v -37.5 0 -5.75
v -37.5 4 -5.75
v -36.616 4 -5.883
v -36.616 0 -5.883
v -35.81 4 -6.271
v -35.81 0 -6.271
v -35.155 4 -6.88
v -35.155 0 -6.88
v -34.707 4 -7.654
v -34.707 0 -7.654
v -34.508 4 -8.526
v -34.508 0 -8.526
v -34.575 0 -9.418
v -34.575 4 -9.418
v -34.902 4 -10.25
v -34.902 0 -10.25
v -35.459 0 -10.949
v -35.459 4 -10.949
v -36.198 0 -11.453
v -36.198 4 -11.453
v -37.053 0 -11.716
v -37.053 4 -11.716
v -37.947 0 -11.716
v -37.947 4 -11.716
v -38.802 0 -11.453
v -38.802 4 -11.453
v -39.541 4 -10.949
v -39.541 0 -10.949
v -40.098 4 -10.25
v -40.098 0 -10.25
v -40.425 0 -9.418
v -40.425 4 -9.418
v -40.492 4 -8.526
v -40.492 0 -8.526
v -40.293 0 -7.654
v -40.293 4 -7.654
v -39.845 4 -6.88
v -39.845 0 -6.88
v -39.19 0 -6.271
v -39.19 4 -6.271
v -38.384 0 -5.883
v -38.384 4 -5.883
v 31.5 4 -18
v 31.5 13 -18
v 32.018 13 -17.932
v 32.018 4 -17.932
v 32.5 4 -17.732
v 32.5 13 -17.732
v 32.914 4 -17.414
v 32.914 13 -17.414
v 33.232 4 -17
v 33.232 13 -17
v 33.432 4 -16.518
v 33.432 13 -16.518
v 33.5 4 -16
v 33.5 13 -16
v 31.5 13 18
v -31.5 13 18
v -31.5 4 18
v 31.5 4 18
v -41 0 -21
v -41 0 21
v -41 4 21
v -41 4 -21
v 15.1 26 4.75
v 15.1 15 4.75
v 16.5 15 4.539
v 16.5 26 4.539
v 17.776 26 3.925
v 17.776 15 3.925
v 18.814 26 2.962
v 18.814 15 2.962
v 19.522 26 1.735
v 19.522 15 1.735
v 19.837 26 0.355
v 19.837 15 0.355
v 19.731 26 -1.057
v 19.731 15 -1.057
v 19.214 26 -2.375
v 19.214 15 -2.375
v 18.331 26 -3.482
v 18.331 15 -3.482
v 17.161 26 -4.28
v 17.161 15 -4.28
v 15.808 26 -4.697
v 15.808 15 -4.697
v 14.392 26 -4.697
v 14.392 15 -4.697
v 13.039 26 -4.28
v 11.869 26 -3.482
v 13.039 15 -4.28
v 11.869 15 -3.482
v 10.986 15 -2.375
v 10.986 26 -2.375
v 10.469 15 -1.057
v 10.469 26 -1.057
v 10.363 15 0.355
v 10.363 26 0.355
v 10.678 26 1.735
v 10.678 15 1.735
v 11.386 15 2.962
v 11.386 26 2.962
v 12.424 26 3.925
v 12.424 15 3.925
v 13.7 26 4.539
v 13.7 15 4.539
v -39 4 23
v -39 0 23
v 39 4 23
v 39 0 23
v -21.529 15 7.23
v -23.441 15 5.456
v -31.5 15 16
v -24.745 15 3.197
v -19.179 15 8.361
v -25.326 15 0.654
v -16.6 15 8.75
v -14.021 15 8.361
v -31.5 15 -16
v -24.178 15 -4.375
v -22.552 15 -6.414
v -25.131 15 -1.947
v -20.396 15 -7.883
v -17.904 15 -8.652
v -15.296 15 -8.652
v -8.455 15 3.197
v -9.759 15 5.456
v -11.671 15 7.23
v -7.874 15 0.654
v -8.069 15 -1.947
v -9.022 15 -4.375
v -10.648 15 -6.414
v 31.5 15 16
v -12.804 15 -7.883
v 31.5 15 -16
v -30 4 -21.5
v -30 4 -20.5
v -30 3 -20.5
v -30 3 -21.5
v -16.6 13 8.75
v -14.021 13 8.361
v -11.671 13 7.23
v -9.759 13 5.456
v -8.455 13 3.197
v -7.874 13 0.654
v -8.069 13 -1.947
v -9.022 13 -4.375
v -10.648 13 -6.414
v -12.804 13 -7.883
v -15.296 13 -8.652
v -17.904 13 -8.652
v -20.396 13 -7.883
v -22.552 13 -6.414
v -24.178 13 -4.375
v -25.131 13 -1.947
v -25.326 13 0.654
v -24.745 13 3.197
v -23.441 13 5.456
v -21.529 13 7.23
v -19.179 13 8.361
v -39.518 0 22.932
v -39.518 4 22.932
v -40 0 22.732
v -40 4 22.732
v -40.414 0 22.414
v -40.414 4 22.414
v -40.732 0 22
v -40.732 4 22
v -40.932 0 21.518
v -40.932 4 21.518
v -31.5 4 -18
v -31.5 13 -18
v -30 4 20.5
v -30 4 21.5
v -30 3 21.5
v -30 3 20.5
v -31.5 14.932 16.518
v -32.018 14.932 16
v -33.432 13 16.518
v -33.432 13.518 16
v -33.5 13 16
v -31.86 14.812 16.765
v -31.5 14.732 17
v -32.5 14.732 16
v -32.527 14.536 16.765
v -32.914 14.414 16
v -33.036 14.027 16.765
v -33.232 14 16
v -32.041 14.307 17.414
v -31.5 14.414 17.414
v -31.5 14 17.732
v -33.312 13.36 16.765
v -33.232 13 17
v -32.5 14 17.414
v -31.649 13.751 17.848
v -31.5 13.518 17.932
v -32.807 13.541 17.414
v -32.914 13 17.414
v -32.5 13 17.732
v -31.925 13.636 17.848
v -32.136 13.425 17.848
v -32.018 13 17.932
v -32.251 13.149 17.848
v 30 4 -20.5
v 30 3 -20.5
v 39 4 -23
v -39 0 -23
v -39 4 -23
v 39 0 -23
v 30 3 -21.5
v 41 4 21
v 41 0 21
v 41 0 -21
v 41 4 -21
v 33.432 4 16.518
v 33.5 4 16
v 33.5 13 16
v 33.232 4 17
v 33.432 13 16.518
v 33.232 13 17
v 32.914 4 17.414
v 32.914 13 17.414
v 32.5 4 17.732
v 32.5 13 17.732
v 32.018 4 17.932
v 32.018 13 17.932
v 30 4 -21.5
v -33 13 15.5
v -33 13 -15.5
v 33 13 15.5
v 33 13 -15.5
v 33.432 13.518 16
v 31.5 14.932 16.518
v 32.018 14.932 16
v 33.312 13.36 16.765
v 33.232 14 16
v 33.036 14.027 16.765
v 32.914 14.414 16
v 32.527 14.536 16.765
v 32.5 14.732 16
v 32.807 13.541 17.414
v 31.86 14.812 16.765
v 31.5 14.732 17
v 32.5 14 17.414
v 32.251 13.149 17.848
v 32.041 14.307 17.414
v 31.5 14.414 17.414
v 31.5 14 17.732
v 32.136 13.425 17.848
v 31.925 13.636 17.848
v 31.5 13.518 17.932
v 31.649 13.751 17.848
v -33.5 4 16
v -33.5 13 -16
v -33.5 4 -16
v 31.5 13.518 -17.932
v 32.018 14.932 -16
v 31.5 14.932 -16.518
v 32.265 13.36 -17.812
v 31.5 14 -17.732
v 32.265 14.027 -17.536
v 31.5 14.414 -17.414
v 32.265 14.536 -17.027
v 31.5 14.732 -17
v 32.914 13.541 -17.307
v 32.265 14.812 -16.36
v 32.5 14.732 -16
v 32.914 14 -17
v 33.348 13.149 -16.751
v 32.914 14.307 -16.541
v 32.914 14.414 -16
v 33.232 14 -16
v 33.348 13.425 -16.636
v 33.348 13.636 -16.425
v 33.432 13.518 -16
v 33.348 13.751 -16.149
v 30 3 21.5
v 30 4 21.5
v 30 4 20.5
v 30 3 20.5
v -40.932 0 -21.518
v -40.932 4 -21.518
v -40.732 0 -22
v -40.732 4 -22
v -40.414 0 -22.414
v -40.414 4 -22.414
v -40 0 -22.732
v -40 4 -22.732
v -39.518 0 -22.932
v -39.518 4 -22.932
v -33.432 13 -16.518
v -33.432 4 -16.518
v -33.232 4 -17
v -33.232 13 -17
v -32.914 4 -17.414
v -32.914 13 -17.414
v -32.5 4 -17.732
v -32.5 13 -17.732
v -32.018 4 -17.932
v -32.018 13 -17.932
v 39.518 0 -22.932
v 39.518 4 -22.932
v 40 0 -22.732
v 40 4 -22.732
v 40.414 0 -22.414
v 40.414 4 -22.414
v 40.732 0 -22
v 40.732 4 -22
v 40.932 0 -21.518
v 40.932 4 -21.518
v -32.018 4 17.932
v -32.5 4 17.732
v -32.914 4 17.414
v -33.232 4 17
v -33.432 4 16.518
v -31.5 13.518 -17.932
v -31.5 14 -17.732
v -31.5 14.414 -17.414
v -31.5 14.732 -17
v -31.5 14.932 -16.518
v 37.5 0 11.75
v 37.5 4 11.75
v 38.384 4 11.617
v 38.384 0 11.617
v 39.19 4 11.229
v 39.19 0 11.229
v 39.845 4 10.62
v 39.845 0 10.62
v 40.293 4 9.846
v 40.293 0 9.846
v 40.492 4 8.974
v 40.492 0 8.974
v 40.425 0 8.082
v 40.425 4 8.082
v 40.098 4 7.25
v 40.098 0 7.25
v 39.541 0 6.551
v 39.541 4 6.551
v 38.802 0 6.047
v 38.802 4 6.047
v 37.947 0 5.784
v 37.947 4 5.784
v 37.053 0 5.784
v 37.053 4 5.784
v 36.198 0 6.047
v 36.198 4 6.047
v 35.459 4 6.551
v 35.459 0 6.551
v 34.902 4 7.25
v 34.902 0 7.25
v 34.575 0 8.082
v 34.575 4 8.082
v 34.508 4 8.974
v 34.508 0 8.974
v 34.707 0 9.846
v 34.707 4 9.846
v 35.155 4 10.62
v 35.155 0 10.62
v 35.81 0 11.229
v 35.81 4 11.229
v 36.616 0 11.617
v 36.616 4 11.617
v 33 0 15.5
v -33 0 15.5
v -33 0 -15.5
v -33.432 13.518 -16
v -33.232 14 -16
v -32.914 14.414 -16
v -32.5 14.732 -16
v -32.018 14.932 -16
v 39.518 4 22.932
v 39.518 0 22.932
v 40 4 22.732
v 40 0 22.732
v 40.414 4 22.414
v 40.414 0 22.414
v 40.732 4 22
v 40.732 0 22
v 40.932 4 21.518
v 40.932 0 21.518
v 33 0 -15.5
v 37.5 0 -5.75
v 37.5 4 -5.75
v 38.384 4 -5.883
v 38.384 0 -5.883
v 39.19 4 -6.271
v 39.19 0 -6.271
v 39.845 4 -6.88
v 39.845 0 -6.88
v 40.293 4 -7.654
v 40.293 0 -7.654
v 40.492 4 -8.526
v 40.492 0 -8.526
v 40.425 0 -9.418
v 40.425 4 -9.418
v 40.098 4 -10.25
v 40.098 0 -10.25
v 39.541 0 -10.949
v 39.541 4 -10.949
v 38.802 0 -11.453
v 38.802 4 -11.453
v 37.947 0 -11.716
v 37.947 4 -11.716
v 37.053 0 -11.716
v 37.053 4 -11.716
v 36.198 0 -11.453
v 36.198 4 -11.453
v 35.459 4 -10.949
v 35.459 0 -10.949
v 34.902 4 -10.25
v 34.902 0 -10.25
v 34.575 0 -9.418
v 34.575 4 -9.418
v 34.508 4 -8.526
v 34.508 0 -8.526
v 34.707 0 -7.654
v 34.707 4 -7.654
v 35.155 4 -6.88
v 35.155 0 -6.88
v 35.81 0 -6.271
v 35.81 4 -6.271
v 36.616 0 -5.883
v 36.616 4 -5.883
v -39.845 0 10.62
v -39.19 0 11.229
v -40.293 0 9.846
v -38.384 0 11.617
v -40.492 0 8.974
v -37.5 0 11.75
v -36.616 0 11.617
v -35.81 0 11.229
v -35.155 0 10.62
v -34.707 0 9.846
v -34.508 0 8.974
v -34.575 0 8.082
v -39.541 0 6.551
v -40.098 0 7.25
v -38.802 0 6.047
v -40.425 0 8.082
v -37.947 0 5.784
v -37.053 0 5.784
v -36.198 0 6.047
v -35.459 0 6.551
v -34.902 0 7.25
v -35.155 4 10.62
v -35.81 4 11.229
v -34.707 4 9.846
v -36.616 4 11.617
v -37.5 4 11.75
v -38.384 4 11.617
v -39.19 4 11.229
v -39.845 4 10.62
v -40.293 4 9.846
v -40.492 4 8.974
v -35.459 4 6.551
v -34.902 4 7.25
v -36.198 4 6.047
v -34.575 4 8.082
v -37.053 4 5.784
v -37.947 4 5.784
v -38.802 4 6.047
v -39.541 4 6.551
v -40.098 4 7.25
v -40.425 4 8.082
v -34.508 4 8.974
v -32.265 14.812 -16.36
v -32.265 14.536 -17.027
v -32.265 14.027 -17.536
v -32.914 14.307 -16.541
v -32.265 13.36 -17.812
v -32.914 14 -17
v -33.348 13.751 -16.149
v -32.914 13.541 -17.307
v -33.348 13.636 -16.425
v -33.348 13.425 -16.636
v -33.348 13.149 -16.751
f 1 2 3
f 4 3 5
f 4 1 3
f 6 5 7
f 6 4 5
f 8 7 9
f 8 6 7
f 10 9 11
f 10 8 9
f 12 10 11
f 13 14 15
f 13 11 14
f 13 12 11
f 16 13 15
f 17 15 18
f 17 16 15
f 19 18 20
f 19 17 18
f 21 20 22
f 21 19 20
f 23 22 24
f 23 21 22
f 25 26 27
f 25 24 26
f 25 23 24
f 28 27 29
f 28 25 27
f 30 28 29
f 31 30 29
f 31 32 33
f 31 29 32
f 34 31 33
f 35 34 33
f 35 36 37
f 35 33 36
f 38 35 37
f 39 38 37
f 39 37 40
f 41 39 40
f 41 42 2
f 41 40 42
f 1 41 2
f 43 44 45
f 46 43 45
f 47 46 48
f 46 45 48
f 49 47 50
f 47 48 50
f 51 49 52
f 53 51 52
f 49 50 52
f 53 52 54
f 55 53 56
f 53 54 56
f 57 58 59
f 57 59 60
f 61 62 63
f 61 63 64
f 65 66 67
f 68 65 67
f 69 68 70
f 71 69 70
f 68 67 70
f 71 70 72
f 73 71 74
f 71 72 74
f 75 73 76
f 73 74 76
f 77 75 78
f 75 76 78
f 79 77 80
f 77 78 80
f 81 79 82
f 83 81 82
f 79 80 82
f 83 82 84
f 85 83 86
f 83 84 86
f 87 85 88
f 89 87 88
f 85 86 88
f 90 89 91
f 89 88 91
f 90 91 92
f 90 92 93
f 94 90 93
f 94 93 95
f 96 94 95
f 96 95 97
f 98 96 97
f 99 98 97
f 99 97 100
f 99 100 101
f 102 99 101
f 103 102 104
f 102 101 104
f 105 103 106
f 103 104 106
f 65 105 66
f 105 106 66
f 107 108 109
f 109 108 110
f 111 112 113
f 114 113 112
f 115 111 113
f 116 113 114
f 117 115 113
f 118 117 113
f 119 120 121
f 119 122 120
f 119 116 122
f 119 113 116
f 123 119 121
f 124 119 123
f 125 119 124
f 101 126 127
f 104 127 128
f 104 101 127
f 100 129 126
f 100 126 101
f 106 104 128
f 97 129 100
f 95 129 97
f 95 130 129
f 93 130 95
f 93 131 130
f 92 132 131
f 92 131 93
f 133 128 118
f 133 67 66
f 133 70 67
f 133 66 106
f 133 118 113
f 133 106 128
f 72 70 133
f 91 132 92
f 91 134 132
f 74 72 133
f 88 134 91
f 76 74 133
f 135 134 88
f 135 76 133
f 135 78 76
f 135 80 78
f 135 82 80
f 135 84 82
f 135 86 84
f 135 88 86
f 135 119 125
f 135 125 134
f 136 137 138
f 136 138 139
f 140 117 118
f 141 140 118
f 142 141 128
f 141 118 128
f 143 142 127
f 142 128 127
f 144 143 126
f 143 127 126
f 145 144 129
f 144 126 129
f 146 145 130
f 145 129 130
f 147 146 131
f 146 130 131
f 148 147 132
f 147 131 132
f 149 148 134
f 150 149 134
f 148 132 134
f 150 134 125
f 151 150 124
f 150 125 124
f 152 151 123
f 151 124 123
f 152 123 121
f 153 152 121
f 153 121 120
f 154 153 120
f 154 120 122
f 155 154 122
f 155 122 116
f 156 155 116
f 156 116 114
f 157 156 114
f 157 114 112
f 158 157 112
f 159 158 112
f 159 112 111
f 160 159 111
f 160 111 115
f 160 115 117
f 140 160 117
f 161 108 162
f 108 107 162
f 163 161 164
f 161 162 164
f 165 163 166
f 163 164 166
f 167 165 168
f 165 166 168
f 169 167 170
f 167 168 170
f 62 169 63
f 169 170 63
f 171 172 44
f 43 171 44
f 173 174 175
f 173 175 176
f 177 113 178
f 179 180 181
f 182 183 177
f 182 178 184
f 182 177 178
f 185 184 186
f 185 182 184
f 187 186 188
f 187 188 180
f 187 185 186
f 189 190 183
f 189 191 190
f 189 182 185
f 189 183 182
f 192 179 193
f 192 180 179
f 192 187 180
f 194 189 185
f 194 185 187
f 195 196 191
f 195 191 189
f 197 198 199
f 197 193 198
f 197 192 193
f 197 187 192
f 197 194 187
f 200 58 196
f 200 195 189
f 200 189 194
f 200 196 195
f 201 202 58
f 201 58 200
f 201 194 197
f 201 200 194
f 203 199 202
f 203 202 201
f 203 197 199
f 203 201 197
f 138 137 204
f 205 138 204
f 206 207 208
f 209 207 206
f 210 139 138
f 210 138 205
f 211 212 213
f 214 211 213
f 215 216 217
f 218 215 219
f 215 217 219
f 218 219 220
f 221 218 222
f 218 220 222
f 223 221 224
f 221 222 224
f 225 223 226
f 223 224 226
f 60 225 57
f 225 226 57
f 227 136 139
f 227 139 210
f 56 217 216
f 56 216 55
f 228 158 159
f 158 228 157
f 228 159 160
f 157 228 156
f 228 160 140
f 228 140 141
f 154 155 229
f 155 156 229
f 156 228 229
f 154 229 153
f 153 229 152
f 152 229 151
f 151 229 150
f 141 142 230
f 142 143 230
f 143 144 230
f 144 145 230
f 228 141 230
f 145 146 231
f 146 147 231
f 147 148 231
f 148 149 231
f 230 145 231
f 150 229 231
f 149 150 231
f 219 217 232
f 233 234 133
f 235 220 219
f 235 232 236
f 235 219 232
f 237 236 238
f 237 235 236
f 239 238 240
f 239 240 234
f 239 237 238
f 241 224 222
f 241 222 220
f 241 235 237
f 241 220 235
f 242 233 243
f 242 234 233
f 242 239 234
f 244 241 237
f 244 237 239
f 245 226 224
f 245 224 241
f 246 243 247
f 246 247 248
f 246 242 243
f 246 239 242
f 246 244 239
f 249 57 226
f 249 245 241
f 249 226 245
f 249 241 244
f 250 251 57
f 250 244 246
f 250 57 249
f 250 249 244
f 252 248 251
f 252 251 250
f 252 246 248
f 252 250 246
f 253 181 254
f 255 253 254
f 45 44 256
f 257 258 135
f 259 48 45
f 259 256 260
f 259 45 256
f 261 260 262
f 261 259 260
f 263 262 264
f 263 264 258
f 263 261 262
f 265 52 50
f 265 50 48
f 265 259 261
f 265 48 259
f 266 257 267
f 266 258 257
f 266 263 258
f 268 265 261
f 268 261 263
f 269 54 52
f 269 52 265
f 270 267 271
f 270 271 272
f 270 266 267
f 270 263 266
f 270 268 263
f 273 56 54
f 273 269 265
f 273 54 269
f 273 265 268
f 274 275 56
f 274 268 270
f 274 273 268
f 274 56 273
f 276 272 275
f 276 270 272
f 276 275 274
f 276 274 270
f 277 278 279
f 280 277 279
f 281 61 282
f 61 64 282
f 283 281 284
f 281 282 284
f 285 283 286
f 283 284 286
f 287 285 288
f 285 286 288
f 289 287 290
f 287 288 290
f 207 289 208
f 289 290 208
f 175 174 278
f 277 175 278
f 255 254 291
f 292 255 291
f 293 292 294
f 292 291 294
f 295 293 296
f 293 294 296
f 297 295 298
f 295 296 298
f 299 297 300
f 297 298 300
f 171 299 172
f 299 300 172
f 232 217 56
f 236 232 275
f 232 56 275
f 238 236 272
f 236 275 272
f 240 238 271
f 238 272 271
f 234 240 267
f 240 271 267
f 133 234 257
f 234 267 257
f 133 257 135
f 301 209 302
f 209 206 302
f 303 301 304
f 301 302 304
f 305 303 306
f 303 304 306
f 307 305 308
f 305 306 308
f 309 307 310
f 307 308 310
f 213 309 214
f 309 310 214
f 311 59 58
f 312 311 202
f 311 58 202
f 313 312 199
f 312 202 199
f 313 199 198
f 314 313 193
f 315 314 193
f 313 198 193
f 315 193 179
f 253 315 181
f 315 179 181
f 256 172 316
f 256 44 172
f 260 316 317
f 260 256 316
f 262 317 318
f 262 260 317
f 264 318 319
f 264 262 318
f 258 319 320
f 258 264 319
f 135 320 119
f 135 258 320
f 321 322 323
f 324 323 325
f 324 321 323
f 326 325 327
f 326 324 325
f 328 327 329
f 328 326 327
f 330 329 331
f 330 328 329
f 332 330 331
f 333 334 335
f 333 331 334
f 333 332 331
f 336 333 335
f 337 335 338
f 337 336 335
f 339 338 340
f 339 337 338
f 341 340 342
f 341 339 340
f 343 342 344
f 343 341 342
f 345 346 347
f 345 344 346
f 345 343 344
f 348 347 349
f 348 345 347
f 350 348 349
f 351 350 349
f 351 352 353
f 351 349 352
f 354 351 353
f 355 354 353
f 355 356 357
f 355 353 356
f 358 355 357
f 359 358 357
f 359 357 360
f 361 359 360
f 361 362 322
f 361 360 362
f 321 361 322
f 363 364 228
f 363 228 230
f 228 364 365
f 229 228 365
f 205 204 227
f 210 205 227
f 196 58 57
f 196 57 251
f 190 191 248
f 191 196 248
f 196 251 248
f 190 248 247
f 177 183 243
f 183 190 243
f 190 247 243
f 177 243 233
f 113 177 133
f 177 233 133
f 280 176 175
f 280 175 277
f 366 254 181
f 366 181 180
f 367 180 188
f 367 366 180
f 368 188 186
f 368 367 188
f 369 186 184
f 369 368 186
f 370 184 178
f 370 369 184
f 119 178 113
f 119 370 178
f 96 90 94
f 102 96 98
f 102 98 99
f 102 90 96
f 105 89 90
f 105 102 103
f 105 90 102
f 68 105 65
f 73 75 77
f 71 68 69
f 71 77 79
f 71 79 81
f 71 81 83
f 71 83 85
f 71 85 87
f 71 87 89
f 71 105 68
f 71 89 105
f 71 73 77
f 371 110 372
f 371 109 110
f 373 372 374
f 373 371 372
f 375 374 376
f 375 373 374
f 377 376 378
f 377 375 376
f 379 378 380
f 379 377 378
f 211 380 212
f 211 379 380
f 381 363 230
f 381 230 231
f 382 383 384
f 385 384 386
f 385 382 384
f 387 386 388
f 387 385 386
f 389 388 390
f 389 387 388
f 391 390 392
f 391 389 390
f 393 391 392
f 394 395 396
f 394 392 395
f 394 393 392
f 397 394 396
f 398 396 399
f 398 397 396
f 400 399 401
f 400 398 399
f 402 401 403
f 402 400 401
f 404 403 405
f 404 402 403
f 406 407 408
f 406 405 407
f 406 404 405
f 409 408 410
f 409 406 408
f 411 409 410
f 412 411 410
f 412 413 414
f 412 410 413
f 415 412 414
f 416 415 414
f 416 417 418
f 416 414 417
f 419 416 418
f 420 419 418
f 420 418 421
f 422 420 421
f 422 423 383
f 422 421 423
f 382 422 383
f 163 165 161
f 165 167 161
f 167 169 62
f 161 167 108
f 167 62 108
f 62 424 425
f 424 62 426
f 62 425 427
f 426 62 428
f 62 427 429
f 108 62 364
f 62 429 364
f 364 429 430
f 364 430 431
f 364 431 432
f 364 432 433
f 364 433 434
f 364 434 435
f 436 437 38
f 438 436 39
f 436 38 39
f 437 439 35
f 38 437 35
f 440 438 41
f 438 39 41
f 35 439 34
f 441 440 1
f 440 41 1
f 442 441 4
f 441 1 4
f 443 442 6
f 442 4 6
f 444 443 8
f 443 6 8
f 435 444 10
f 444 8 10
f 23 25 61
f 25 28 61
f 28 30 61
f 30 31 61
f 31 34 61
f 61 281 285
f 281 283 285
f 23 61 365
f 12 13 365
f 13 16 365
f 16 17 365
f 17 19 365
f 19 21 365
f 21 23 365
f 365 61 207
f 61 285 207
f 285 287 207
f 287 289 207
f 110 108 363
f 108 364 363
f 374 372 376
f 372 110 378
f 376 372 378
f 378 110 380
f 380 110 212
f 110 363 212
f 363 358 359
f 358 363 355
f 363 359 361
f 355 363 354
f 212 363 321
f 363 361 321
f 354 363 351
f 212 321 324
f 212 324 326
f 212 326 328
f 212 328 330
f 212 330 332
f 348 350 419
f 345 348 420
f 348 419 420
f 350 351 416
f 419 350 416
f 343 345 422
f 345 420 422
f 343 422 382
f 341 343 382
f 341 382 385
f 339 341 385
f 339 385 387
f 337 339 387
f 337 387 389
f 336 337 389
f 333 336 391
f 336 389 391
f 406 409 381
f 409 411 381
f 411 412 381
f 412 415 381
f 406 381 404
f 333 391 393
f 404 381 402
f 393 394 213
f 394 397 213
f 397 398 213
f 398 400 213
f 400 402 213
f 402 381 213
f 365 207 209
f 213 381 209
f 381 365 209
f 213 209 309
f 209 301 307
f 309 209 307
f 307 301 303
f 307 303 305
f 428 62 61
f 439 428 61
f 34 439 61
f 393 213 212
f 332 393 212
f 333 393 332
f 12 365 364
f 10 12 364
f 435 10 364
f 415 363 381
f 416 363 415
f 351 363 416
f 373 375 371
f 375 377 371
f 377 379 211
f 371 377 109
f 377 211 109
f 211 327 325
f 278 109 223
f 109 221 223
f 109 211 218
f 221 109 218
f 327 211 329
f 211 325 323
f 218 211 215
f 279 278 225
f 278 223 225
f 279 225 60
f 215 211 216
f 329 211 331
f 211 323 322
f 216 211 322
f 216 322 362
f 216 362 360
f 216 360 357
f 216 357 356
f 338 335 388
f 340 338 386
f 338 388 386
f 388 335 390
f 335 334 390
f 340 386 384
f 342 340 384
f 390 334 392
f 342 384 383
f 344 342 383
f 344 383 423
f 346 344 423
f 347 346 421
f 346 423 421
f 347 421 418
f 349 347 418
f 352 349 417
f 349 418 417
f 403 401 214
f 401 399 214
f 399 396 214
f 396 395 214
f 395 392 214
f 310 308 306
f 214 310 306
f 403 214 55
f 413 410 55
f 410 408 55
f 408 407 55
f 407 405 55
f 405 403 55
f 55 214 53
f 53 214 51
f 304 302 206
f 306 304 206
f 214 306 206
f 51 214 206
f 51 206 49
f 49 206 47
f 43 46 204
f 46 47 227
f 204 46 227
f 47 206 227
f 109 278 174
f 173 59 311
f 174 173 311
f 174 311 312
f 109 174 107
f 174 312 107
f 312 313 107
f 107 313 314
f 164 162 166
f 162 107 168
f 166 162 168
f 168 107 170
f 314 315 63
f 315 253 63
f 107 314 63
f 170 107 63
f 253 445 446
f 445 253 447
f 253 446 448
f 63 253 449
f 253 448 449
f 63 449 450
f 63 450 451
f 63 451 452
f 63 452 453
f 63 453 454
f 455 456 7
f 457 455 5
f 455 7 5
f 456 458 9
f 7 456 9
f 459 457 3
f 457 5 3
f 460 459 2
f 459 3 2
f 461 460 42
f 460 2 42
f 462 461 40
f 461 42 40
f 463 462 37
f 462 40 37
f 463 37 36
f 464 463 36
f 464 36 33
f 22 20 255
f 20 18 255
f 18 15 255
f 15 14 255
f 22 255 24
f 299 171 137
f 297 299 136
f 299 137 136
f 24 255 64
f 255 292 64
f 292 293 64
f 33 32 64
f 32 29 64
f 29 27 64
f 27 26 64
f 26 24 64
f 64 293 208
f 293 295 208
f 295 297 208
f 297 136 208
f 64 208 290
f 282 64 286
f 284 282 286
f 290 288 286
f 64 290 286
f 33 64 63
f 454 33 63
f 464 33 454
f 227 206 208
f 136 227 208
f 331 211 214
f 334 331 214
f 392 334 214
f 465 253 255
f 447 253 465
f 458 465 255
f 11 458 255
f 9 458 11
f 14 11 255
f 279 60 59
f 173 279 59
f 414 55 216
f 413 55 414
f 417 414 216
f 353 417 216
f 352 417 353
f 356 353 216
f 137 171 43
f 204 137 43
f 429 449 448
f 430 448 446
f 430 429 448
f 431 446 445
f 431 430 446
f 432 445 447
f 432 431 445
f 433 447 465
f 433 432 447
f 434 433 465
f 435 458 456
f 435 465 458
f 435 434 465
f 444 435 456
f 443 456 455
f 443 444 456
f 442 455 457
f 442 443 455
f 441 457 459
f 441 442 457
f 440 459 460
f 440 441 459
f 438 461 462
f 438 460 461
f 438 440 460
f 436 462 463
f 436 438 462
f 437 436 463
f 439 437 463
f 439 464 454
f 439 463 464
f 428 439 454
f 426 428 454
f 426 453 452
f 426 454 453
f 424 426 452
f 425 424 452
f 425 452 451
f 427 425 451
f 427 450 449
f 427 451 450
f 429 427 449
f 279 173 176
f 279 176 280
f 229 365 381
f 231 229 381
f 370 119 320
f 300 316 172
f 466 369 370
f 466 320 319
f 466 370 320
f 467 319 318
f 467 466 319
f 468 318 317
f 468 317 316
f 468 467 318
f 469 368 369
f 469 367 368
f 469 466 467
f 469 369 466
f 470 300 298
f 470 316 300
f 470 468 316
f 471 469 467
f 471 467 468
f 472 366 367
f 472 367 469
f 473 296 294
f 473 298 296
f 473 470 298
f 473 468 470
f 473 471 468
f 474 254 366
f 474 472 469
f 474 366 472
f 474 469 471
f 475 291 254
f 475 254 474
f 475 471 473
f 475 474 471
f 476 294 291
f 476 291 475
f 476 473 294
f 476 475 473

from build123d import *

# Parameters (mm, degrees)
ESQUISSE1_W             = 82
ESQUISSE1_H             = 46
ESQUISSE1_R             = 3
BOSS_EXTRU_1_DEPTH      = 15
ESQUISSE2_W             = 66
ESQUISSE2_H             = 31
ENL_V_MAT_EXTRU_1_DEPTH = 13
ENL_V_START             = 15
ESQUISSE3_R             = 8.75
ENL_V_MAT_EXTRU_2_DEPTH = 65.345719166
ESQUISSE4_W             = 67
ESQUISSE4_H             = 36
ENL_V_MAT_EXTRU_3_DEPTH = 11
BOSS_EXTRU_3_START      = 15
ESQUISSE5_R             = 4.75
BOSS_EXTRU_3_DEPTH      = 11
ENL_V_START_2           = 4
ESQUISSE1_4_W           = 60
ESQUISSE1_4_H           = 1
ENL_V_MAT_EXTRU_4_DEPTH = 1
CONG_1_R                = 2
CONG_2_R                = 2
CONG_4_R                = 2


with BuildPart() as part:
    # Esquisse1 → Boss.-Extru.1 (new body)
    with BuildSketch(Plane(origin=(0, 0, 0), x_dir=(1, 0, 0), z_dir=(0, 1, 0))):
        Rectangle(ESQUISSE1_W, ESQUISSE1_H)
        with Locations(Location((-37.5, 8.75, 0), (0, 0, 270))):
            Circle(ESQUISSE1_R, mode=Mode.SUBTRACT)
        with Locations(Location((37.5, 8.75, 0), (0, 0, 270))):
            Circle(ESQUISSE1_R, mode=Mode.SUBTRACT)
        with Locations(Location((37.5, -8.75, 0), (0, 0, 270))):
            Circle(ESQUISSE1_R, mode=Mode.SUBTRACT)
        with Locations(Location((-37.5, -8.75, 0), (0, 0, 270))):
            Circle(ESQUISSE1_R, mode=Mode.SUBTRACT)
    extrude(amount=BOSS_EXTRU_1_DEPTH)

    # Esquisse2 → Enlèv. mat.-Extru.1 (cut)
    with BuildSketch(Plane(origin=(0, 0, 0), x_dir=(1, 0, 0), z_dir=(0, 1, 0))):
        Rectangle(ESQUISSE2_W, ESQUISSE2_H)
    extrude(amount=ENL_V_MAT_EXTRU_1_DEPTH, mode=Mode.SUBTRACT)

    # Esquisse3 → Enlèv. mat.-Extru.2 (cut, through all)
    with BuildSketch(Plane(origin=(0, 0, 0), x_dir=(1, 0, 0), z_dir=(0, 1, 0)).offset(ENL_V_START)):
        with Locations(Location((-16.6, 0, 0), (0, 0, 270))):
            Circle(ESQUISSE3_R)
    extrude(amount=-ENL_V_MAT_EXTRU_2_DEPTH, mode=Mode.SUBTRACT)

    # Esquisse4 → Enlèv. mat.-Extru.3 (cut)
    with BuildSketch(Plane(origin=(0, 0, 0), x_dir=(1, 0, 0), z_dir=(0, 1, 0)).offset(ENL_V_START)):
        Polygon((-33.5, -23), (-41, -23), (-41, 23), (-33.5, 23), (33.5, 23), (41, 23), (41, -23), (33.5, -23), align=None)
        Rectangle(ESQUISSE4_W, ESQUISSE4_H, mode=Mode.SUBTRACT)
    extrude(amount=-ENL_V_MAT_EXTRU_3_DEPTH, mode=Mode.SUBTRACT)

    # Esquisse5 → Boss.-Extru.3 (add)
    with BuildSketch(Plane(origin=(0, 0, 0), x_dir=(1, 0, 0), z_dir=(0, 1, 0)).offset(BOSS_EXTRU_3_START)):
        with Locations(Location((15.1, 0, 0), (0, 0, 270))):
            Circle(ESQUISSE5_R)
    extrude(amount=BOSS_EXTRU_3_DEPTH)

    # Esquisse1<4> → Enlèv. mat.-Extru.4 (cut)
    with BuildSketch(Plane(origin=(0, 0, 0), x_dir=(1, 0, 0), z_dir=(0, 1, 0)).offset(ENL_V_START_2)):
        with Locations((0, -21)):
            Rectangle(ESQUISSE1_4_W, ESQUISSE1_4_H)
        with Locations((0, 21)):
            Rectangle(ESQUISSE1_4_W, ESQUISSE1_4_H)
    extrude(amount=-ENL_V_MAT_EXTRU_4_DEPTH, mode=Mode.SUBTRACT)

    # Congé1
    cong_1_edges = [part.edges().sort_by_distance(p)[0] for p in [
        (0, 15, 18),
        (-33.5, 15, 0),
        (0, 15, -18),
        (33.5, 15, 0),
    ]]
    fillet(cong_1_edges, radius=CONG_1_R)

    # Congé2
    # the kernel refuses this fillet: 2 mm, written as the material it takes off along each edge
    with BuildSketch(Plane(origin=(-31.5, 13, -16), x_dir=(0, 0, -1), z_dir=(-1, 0, 0))) as cong_2_piece_1_section:
        Polygon((0, 0), (CONG_2_R, 0), (CONG_2_R, -CONG_2_R), (0, -CONG_2_R), align=None)
    cong_2_piece_1 = extrude(amount=CONG_2_R, mode=Mode.PRIVATE)
    cong_2_piece_1 = cong_2_piece_1 - Plane(origin=(-31.5, 13, -16), x_dir=(0, -0.7071067811865475, 0.7071067811865475), z_dir=(-1, 0, 0)) * Sphere(CONG_2_R, mode=Mode.PRIVATE)
    add(cong_2_piece_1, mode=Mode.SUBTRACT)
    with BuildSketch(Plane(origin=(-31.5, 13, 16), x_dir=(-1, 0, 0), z_dir=(0, 0, 1))) as cong_2_piece_2_section:
        Polygon((0, 0), (CONG_2_R, 0), (CONG_2_R, -CONG_2_R), (0, -CONG_2_R), align=None)
    cong_2_piece_2 = extrude(amount=CONG_2_R, mode=Mode.PRIVATE)
    cong_2_piece_2 = cong_2_piece_2 - Plane(origin=(-31.5, 13, 16), x_dir=(0.7071067811865475, -0.7071067811865475, 0), z_dir=(0, 0, 1)) * Sphere(CONG_2_R, mode=Mode.PRIVATE)
    add(cong_2_piece_2, mode=Mode.SUBTRACT)
    with BuildSketch(Plane(origin=(31.5, 13, -16), x_dir=(0, 0, -1), z_dir=(1, 0, 0))) as cong_2_piece_3_section:
        Polygon((0, 0), (CONG_2_R, 0), (CONG_2_R, CONG_2_R), (0, CONG_2_R), align=None)
    cong_2_piece_3 = extrude(amount=CONG_2_R, mode=Mode.PRIVATE)
    cong_2_piece_3 = cong_2_piece_3 - Plane(origin=(31.5, 13, -16), x_dir=(0, -0.7071067811865475, 0.7071067811865475), z_dir=(1, 0, 0)) * Sphere(CONG_2_R, mode=Mode.PRIVATE)
    add(cong_2_piece_3, mode=Mode.SUBTRACT)
    with BuildSketch(Plane(origin=(31.5, 13, 16), x_dir=(1, 0, 0), z_dir=(0, 0, 1))) as cong_2_piece_4_section:
        Polygon((0, 0), (CONG_2_R, 0), (CONG_2_R, CONG_2_R), (0, CONG_2_R), align=None)
    cong_2_piece_4 = extrude(amount=CONG_2_R, mode=Mode.PRIVATE)
    cong_2_piece_4 = cong_2_piece_4 - Plane(origin=(31.5, 13, 16), x_dir=(-0.7071067811865475, -0.7071067811865475, 0), z_dir=(0, 0, 1)) * Sphere(CONG_2_R, mode=Mode.PRIVATE)
    add(cong_2_piece_4, mode=Mode.SUBTRACT)
    with BuildSketch(Plane(origin=(-33.5, 13, 18), x_dir=(1, 0, 0), z_dir=(0, -1, 0)), Plane(origin=(-33.5, 13, -18), x_dir=(0, 0, 1), z_dir=(0, -1, 0))) as cong_2_piece_5:
        with BuildLine():
            CenterArc((CONG_2_R, -CONG_2_R), CONG_2_R, 90, 90)
            Line((0, -CONG_2_R), (0, 0))
            Line((0, 0), (CONG_2_R, 0))
        make_face()
    extrude(amount=9, mode=Mode.SUBTRACT)
    with BuildSketch(Plane(origin=(33.5, 13, -18), x_dir=(0, 0, 1), z_dir=(0, -1, 0)), Plane(origin=(33.5, 13, 18), x_dir=(-1, 0, 0), z_dir=(0, -1, 0))) as cong_2_piece_6:
        with BuildLine():
            CenterArc((CONG_2_R, CONG_2_R), CONG_2_R, 180, 90)
            Line((0, CONG_2_R), (0, 0))
            Line((0, 0), (CONG_2_R, 0))
        make_face()
    extrude(amount=9, mode=Mode.SUBTRACT)

    # Congé4
    cong_4_edges = [part.edges().sort_by_distance(p)[0] for p in [
        (41, 2, 23),
        (-41, 2, 23),
        (-41, 2, -23),
        (41, 2, -23),
    ]]
    fillet(cong_4_edges, radius=CONG_4_R)


solid = part.part
